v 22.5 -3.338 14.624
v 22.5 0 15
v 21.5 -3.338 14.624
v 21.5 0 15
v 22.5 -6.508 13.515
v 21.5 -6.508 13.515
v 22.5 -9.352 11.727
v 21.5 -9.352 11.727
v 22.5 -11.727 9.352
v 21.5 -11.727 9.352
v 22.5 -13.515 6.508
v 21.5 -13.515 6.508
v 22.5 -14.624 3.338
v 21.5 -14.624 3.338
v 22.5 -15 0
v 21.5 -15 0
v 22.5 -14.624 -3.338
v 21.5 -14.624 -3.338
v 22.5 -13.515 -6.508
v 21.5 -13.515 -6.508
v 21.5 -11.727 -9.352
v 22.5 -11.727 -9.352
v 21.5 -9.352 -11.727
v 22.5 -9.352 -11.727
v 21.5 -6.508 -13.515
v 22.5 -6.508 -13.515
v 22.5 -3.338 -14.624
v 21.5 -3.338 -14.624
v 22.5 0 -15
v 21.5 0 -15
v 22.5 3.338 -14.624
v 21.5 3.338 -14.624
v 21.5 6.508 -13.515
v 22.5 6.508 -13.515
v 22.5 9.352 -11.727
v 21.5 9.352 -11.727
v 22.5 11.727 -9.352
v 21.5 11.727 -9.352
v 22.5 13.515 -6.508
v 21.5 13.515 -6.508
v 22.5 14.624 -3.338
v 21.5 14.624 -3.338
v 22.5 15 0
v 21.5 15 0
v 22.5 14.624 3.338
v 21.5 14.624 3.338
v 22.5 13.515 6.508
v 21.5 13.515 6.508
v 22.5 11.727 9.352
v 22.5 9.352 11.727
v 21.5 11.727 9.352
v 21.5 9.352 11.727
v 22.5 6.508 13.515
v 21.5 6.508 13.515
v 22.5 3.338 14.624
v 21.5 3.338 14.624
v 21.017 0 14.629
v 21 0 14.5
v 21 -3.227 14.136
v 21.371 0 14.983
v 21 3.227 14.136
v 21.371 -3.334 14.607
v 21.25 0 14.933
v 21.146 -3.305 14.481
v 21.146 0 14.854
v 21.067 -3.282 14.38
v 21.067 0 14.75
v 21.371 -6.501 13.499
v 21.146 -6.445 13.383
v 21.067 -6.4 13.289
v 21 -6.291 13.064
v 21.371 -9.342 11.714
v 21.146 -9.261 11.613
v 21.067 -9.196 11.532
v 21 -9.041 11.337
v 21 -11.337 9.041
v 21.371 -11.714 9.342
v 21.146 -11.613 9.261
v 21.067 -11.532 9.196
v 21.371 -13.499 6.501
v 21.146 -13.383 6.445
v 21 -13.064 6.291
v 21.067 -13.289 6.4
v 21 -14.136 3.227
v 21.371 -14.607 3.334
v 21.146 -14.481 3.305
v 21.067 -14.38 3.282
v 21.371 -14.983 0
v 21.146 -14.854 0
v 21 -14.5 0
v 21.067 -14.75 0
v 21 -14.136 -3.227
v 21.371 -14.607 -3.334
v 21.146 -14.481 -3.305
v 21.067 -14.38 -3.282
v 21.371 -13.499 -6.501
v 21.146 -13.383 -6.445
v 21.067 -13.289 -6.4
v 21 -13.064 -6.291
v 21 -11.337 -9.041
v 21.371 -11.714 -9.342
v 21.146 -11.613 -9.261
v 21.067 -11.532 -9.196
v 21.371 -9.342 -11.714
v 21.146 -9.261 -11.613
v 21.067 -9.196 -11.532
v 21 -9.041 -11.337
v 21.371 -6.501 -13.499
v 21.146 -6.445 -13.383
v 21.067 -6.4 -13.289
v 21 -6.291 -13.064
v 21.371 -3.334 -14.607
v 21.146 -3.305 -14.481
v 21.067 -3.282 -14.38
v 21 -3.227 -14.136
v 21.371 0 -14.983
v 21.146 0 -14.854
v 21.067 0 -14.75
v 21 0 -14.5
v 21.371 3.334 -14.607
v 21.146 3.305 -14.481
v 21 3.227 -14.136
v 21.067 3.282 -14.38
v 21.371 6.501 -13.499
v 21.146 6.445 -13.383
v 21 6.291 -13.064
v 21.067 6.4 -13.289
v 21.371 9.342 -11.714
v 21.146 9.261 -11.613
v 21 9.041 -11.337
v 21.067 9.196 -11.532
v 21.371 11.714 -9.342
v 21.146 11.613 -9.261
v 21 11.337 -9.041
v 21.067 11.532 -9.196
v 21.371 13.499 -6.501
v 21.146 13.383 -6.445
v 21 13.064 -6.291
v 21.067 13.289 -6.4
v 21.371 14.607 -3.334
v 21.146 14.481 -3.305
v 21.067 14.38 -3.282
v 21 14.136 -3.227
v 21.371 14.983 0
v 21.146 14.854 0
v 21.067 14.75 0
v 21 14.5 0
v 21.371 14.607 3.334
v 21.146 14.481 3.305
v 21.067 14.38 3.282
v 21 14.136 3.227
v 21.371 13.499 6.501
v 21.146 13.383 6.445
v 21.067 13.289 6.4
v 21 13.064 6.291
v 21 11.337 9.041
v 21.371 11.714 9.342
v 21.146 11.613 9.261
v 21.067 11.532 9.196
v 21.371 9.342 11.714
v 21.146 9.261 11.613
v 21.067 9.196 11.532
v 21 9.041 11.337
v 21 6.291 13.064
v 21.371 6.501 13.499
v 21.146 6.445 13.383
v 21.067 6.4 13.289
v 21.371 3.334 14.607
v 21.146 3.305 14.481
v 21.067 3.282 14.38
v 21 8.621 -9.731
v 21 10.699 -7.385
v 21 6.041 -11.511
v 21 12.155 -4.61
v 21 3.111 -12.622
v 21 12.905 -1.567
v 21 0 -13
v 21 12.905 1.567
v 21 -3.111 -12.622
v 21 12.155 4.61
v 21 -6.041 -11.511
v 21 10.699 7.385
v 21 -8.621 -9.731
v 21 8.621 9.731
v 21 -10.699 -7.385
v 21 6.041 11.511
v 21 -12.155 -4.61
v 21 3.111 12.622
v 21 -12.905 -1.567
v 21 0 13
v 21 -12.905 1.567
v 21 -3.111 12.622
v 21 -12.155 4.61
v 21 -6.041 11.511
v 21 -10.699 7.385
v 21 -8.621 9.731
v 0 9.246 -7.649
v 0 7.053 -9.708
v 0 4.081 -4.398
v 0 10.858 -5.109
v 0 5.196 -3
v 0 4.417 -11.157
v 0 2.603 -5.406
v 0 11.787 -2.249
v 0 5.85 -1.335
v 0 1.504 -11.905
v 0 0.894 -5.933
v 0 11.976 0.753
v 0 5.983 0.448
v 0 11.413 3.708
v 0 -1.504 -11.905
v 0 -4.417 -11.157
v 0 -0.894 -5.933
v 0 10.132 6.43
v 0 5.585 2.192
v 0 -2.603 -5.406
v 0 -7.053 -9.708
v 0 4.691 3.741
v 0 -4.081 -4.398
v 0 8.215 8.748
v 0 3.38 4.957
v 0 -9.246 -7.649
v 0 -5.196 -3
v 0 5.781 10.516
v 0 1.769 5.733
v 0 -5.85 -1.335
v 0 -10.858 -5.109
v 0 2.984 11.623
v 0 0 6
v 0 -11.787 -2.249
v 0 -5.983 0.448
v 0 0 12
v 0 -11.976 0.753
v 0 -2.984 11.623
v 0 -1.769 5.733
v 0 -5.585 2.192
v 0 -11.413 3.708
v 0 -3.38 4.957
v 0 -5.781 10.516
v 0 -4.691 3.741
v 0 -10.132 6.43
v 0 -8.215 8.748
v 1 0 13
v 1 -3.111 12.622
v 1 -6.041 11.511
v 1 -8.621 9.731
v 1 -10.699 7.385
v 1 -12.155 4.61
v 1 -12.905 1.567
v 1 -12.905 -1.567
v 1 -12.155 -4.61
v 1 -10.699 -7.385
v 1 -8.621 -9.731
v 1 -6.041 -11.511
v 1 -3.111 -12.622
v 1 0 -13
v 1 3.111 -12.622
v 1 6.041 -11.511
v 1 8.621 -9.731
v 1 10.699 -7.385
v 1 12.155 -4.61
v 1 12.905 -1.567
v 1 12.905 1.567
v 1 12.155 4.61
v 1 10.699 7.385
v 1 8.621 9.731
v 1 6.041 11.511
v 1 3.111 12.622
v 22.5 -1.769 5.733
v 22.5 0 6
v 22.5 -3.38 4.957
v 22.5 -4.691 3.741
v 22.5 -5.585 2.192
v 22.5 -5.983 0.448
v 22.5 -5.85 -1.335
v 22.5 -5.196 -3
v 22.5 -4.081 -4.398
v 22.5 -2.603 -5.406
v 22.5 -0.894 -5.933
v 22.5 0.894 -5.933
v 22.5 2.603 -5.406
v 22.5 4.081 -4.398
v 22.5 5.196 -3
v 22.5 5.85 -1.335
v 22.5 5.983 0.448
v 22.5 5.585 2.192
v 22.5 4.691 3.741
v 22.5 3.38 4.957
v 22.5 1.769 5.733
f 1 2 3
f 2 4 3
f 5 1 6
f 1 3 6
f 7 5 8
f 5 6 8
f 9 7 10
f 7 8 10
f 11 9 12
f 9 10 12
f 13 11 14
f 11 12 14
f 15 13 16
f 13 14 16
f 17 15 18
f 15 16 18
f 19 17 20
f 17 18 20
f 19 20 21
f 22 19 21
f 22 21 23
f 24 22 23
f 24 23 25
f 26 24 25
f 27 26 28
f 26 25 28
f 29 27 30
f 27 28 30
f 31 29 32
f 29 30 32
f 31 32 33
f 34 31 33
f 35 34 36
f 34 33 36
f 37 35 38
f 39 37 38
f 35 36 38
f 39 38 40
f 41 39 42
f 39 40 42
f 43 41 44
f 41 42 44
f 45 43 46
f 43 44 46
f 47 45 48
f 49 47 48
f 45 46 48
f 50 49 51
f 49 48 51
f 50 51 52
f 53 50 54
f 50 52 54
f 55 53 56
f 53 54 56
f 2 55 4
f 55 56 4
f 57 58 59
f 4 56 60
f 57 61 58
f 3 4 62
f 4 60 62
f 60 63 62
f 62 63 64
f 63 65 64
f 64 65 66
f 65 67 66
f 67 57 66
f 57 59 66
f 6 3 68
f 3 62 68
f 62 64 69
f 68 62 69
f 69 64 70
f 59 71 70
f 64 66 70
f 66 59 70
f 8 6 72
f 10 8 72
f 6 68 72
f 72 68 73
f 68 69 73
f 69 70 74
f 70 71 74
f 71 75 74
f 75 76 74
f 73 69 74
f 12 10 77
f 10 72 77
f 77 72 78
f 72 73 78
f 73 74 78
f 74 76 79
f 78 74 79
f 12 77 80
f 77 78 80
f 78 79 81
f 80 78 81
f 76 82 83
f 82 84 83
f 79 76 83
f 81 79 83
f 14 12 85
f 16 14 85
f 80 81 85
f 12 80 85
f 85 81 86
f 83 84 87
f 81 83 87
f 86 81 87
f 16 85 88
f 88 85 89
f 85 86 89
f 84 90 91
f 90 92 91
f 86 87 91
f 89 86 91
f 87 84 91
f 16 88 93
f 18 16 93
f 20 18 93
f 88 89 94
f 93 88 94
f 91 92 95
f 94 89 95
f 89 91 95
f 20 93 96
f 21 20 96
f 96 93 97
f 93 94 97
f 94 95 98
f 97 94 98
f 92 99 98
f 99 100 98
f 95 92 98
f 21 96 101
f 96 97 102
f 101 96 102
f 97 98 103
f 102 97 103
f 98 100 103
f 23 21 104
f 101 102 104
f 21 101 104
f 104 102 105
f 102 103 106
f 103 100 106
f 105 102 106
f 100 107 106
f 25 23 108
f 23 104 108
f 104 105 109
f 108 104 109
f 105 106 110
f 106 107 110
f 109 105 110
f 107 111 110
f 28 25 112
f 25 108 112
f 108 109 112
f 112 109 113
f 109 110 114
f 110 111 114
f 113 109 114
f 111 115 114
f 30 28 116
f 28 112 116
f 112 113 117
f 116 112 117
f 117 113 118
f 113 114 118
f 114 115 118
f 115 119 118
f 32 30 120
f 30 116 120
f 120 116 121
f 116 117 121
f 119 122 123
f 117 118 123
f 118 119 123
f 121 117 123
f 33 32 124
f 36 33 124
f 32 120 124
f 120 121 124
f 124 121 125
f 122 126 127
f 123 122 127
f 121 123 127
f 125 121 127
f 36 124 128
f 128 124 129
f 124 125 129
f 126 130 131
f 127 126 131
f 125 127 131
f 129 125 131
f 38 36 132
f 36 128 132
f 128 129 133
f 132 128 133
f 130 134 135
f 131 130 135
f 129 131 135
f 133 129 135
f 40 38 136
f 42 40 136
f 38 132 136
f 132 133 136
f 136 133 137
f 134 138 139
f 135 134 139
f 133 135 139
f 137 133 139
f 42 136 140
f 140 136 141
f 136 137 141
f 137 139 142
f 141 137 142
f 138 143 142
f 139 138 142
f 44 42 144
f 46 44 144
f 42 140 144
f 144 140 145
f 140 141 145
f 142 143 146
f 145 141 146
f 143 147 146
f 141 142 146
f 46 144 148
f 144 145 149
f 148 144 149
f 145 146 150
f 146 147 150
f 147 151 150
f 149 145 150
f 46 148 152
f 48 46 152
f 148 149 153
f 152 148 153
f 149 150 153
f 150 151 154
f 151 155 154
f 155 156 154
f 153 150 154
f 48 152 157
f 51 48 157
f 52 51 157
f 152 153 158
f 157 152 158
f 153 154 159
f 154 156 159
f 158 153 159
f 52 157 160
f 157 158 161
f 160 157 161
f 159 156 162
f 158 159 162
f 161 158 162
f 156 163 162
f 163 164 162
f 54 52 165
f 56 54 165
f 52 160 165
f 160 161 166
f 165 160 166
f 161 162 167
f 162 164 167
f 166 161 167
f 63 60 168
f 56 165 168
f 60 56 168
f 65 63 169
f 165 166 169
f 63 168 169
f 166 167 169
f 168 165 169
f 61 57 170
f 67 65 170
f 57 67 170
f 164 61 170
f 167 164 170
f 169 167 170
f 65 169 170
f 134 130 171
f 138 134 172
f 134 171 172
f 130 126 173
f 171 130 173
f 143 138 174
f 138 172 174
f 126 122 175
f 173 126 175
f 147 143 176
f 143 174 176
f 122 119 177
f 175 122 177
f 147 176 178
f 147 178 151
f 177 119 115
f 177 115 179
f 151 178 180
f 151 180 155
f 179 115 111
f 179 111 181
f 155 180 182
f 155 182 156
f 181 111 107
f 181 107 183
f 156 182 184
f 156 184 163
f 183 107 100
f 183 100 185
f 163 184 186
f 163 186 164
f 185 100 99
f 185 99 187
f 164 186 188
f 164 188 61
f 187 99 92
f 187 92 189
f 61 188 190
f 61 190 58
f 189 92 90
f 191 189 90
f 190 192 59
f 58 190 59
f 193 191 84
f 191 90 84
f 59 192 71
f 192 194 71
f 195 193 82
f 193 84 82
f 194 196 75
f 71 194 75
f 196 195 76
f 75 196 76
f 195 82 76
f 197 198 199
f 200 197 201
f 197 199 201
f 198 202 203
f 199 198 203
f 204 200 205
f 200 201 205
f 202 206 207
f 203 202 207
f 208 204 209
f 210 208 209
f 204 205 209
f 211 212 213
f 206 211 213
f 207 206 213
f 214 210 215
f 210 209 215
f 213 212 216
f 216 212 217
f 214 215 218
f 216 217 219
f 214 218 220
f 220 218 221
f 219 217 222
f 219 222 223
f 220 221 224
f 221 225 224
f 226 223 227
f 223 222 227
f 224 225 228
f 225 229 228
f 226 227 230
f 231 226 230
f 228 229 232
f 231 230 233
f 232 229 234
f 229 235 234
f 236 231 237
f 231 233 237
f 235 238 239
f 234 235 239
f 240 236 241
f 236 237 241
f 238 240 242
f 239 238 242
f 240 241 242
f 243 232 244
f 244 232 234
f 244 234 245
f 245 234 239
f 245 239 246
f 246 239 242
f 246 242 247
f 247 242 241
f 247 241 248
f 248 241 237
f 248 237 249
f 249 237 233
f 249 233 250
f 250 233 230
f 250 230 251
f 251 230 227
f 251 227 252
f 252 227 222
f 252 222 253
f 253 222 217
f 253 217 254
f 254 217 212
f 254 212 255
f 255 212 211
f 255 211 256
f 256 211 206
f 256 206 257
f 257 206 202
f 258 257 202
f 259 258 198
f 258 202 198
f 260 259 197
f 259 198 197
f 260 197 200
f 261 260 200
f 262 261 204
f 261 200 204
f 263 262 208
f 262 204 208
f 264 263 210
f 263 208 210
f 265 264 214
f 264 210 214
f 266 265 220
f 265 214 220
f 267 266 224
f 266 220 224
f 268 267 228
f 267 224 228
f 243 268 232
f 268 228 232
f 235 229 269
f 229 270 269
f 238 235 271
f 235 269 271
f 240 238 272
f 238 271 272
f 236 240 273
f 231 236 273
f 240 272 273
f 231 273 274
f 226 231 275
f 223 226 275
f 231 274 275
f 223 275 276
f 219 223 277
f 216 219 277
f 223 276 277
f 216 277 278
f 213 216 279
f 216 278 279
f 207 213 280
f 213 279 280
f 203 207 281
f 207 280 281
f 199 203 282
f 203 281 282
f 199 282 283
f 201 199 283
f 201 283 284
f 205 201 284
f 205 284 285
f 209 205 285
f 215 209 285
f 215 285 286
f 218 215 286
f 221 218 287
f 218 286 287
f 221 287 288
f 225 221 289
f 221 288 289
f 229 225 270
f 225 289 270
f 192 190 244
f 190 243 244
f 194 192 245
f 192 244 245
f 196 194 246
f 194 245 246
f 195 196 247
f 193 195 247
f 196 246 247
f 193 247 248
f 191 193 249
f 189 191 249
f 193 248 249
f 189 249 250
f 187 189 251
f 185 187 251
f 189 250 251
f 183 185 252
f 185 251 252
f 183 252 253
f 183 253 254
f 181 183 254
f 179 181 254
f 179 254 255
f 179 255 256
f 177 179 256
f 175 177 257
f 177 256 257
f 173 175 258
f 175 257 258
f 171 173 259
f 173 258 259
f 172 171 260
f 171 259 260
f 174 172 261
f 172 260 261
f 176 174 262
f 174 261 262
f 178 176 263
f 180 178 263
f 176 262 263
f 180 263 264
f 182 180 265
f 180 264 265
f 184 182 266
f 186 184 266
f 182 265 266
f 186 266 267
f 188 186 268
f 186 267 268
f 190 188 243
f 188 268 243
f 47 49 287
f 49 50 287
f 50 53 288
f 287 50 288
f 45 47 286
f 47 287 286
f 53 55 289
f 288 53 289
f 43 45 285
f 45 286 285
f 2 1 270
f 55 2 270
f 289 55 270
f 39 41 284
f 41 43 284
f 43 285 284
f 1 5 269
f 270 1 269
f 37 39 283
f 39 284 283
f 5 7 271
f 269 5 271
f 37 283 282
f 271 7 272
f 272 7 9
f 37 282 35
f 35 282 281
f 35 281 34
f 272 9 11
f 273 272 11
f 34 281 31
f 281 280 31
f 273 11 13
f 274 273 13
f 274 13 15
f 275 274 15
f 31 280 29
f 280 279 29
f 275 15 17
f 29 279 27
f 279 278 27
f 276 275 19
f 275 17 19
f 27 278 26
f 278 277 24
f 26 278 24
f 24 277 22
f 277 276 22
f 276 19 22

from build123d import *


with BuildPart() as part:
    # Esquisse1 → Révolution1 (revolve)
    with BuildSketch(Plane.XY, mode=Mode.PRIVATE) as r_volution1_sk:
        with BuildLine():
            Line((0, 6), (22.5, 6))
            Line((22.5, 6), (22.5, 15))
            Line((22.5, 15), (21.5, 15))
            ThreePointArc((21.5, 15), (21.146446609, 14.853553391), (21, 14.5))
            Line((21, 14.5), (21, 13))
            Line((21, 13), (1, 13))
            Line((1, 13), (0, 12))
            Line((0, 12), (0, 6))
        make_face()
    revolve(r_volution1_sk.sketch.rotate(Axis((0, 0, 0), (1, 0, 0)), 90), axis=Axis((0, 0, 0), (1, 0, 0)))  # turned: the seam where the file's is


solid = part.part
